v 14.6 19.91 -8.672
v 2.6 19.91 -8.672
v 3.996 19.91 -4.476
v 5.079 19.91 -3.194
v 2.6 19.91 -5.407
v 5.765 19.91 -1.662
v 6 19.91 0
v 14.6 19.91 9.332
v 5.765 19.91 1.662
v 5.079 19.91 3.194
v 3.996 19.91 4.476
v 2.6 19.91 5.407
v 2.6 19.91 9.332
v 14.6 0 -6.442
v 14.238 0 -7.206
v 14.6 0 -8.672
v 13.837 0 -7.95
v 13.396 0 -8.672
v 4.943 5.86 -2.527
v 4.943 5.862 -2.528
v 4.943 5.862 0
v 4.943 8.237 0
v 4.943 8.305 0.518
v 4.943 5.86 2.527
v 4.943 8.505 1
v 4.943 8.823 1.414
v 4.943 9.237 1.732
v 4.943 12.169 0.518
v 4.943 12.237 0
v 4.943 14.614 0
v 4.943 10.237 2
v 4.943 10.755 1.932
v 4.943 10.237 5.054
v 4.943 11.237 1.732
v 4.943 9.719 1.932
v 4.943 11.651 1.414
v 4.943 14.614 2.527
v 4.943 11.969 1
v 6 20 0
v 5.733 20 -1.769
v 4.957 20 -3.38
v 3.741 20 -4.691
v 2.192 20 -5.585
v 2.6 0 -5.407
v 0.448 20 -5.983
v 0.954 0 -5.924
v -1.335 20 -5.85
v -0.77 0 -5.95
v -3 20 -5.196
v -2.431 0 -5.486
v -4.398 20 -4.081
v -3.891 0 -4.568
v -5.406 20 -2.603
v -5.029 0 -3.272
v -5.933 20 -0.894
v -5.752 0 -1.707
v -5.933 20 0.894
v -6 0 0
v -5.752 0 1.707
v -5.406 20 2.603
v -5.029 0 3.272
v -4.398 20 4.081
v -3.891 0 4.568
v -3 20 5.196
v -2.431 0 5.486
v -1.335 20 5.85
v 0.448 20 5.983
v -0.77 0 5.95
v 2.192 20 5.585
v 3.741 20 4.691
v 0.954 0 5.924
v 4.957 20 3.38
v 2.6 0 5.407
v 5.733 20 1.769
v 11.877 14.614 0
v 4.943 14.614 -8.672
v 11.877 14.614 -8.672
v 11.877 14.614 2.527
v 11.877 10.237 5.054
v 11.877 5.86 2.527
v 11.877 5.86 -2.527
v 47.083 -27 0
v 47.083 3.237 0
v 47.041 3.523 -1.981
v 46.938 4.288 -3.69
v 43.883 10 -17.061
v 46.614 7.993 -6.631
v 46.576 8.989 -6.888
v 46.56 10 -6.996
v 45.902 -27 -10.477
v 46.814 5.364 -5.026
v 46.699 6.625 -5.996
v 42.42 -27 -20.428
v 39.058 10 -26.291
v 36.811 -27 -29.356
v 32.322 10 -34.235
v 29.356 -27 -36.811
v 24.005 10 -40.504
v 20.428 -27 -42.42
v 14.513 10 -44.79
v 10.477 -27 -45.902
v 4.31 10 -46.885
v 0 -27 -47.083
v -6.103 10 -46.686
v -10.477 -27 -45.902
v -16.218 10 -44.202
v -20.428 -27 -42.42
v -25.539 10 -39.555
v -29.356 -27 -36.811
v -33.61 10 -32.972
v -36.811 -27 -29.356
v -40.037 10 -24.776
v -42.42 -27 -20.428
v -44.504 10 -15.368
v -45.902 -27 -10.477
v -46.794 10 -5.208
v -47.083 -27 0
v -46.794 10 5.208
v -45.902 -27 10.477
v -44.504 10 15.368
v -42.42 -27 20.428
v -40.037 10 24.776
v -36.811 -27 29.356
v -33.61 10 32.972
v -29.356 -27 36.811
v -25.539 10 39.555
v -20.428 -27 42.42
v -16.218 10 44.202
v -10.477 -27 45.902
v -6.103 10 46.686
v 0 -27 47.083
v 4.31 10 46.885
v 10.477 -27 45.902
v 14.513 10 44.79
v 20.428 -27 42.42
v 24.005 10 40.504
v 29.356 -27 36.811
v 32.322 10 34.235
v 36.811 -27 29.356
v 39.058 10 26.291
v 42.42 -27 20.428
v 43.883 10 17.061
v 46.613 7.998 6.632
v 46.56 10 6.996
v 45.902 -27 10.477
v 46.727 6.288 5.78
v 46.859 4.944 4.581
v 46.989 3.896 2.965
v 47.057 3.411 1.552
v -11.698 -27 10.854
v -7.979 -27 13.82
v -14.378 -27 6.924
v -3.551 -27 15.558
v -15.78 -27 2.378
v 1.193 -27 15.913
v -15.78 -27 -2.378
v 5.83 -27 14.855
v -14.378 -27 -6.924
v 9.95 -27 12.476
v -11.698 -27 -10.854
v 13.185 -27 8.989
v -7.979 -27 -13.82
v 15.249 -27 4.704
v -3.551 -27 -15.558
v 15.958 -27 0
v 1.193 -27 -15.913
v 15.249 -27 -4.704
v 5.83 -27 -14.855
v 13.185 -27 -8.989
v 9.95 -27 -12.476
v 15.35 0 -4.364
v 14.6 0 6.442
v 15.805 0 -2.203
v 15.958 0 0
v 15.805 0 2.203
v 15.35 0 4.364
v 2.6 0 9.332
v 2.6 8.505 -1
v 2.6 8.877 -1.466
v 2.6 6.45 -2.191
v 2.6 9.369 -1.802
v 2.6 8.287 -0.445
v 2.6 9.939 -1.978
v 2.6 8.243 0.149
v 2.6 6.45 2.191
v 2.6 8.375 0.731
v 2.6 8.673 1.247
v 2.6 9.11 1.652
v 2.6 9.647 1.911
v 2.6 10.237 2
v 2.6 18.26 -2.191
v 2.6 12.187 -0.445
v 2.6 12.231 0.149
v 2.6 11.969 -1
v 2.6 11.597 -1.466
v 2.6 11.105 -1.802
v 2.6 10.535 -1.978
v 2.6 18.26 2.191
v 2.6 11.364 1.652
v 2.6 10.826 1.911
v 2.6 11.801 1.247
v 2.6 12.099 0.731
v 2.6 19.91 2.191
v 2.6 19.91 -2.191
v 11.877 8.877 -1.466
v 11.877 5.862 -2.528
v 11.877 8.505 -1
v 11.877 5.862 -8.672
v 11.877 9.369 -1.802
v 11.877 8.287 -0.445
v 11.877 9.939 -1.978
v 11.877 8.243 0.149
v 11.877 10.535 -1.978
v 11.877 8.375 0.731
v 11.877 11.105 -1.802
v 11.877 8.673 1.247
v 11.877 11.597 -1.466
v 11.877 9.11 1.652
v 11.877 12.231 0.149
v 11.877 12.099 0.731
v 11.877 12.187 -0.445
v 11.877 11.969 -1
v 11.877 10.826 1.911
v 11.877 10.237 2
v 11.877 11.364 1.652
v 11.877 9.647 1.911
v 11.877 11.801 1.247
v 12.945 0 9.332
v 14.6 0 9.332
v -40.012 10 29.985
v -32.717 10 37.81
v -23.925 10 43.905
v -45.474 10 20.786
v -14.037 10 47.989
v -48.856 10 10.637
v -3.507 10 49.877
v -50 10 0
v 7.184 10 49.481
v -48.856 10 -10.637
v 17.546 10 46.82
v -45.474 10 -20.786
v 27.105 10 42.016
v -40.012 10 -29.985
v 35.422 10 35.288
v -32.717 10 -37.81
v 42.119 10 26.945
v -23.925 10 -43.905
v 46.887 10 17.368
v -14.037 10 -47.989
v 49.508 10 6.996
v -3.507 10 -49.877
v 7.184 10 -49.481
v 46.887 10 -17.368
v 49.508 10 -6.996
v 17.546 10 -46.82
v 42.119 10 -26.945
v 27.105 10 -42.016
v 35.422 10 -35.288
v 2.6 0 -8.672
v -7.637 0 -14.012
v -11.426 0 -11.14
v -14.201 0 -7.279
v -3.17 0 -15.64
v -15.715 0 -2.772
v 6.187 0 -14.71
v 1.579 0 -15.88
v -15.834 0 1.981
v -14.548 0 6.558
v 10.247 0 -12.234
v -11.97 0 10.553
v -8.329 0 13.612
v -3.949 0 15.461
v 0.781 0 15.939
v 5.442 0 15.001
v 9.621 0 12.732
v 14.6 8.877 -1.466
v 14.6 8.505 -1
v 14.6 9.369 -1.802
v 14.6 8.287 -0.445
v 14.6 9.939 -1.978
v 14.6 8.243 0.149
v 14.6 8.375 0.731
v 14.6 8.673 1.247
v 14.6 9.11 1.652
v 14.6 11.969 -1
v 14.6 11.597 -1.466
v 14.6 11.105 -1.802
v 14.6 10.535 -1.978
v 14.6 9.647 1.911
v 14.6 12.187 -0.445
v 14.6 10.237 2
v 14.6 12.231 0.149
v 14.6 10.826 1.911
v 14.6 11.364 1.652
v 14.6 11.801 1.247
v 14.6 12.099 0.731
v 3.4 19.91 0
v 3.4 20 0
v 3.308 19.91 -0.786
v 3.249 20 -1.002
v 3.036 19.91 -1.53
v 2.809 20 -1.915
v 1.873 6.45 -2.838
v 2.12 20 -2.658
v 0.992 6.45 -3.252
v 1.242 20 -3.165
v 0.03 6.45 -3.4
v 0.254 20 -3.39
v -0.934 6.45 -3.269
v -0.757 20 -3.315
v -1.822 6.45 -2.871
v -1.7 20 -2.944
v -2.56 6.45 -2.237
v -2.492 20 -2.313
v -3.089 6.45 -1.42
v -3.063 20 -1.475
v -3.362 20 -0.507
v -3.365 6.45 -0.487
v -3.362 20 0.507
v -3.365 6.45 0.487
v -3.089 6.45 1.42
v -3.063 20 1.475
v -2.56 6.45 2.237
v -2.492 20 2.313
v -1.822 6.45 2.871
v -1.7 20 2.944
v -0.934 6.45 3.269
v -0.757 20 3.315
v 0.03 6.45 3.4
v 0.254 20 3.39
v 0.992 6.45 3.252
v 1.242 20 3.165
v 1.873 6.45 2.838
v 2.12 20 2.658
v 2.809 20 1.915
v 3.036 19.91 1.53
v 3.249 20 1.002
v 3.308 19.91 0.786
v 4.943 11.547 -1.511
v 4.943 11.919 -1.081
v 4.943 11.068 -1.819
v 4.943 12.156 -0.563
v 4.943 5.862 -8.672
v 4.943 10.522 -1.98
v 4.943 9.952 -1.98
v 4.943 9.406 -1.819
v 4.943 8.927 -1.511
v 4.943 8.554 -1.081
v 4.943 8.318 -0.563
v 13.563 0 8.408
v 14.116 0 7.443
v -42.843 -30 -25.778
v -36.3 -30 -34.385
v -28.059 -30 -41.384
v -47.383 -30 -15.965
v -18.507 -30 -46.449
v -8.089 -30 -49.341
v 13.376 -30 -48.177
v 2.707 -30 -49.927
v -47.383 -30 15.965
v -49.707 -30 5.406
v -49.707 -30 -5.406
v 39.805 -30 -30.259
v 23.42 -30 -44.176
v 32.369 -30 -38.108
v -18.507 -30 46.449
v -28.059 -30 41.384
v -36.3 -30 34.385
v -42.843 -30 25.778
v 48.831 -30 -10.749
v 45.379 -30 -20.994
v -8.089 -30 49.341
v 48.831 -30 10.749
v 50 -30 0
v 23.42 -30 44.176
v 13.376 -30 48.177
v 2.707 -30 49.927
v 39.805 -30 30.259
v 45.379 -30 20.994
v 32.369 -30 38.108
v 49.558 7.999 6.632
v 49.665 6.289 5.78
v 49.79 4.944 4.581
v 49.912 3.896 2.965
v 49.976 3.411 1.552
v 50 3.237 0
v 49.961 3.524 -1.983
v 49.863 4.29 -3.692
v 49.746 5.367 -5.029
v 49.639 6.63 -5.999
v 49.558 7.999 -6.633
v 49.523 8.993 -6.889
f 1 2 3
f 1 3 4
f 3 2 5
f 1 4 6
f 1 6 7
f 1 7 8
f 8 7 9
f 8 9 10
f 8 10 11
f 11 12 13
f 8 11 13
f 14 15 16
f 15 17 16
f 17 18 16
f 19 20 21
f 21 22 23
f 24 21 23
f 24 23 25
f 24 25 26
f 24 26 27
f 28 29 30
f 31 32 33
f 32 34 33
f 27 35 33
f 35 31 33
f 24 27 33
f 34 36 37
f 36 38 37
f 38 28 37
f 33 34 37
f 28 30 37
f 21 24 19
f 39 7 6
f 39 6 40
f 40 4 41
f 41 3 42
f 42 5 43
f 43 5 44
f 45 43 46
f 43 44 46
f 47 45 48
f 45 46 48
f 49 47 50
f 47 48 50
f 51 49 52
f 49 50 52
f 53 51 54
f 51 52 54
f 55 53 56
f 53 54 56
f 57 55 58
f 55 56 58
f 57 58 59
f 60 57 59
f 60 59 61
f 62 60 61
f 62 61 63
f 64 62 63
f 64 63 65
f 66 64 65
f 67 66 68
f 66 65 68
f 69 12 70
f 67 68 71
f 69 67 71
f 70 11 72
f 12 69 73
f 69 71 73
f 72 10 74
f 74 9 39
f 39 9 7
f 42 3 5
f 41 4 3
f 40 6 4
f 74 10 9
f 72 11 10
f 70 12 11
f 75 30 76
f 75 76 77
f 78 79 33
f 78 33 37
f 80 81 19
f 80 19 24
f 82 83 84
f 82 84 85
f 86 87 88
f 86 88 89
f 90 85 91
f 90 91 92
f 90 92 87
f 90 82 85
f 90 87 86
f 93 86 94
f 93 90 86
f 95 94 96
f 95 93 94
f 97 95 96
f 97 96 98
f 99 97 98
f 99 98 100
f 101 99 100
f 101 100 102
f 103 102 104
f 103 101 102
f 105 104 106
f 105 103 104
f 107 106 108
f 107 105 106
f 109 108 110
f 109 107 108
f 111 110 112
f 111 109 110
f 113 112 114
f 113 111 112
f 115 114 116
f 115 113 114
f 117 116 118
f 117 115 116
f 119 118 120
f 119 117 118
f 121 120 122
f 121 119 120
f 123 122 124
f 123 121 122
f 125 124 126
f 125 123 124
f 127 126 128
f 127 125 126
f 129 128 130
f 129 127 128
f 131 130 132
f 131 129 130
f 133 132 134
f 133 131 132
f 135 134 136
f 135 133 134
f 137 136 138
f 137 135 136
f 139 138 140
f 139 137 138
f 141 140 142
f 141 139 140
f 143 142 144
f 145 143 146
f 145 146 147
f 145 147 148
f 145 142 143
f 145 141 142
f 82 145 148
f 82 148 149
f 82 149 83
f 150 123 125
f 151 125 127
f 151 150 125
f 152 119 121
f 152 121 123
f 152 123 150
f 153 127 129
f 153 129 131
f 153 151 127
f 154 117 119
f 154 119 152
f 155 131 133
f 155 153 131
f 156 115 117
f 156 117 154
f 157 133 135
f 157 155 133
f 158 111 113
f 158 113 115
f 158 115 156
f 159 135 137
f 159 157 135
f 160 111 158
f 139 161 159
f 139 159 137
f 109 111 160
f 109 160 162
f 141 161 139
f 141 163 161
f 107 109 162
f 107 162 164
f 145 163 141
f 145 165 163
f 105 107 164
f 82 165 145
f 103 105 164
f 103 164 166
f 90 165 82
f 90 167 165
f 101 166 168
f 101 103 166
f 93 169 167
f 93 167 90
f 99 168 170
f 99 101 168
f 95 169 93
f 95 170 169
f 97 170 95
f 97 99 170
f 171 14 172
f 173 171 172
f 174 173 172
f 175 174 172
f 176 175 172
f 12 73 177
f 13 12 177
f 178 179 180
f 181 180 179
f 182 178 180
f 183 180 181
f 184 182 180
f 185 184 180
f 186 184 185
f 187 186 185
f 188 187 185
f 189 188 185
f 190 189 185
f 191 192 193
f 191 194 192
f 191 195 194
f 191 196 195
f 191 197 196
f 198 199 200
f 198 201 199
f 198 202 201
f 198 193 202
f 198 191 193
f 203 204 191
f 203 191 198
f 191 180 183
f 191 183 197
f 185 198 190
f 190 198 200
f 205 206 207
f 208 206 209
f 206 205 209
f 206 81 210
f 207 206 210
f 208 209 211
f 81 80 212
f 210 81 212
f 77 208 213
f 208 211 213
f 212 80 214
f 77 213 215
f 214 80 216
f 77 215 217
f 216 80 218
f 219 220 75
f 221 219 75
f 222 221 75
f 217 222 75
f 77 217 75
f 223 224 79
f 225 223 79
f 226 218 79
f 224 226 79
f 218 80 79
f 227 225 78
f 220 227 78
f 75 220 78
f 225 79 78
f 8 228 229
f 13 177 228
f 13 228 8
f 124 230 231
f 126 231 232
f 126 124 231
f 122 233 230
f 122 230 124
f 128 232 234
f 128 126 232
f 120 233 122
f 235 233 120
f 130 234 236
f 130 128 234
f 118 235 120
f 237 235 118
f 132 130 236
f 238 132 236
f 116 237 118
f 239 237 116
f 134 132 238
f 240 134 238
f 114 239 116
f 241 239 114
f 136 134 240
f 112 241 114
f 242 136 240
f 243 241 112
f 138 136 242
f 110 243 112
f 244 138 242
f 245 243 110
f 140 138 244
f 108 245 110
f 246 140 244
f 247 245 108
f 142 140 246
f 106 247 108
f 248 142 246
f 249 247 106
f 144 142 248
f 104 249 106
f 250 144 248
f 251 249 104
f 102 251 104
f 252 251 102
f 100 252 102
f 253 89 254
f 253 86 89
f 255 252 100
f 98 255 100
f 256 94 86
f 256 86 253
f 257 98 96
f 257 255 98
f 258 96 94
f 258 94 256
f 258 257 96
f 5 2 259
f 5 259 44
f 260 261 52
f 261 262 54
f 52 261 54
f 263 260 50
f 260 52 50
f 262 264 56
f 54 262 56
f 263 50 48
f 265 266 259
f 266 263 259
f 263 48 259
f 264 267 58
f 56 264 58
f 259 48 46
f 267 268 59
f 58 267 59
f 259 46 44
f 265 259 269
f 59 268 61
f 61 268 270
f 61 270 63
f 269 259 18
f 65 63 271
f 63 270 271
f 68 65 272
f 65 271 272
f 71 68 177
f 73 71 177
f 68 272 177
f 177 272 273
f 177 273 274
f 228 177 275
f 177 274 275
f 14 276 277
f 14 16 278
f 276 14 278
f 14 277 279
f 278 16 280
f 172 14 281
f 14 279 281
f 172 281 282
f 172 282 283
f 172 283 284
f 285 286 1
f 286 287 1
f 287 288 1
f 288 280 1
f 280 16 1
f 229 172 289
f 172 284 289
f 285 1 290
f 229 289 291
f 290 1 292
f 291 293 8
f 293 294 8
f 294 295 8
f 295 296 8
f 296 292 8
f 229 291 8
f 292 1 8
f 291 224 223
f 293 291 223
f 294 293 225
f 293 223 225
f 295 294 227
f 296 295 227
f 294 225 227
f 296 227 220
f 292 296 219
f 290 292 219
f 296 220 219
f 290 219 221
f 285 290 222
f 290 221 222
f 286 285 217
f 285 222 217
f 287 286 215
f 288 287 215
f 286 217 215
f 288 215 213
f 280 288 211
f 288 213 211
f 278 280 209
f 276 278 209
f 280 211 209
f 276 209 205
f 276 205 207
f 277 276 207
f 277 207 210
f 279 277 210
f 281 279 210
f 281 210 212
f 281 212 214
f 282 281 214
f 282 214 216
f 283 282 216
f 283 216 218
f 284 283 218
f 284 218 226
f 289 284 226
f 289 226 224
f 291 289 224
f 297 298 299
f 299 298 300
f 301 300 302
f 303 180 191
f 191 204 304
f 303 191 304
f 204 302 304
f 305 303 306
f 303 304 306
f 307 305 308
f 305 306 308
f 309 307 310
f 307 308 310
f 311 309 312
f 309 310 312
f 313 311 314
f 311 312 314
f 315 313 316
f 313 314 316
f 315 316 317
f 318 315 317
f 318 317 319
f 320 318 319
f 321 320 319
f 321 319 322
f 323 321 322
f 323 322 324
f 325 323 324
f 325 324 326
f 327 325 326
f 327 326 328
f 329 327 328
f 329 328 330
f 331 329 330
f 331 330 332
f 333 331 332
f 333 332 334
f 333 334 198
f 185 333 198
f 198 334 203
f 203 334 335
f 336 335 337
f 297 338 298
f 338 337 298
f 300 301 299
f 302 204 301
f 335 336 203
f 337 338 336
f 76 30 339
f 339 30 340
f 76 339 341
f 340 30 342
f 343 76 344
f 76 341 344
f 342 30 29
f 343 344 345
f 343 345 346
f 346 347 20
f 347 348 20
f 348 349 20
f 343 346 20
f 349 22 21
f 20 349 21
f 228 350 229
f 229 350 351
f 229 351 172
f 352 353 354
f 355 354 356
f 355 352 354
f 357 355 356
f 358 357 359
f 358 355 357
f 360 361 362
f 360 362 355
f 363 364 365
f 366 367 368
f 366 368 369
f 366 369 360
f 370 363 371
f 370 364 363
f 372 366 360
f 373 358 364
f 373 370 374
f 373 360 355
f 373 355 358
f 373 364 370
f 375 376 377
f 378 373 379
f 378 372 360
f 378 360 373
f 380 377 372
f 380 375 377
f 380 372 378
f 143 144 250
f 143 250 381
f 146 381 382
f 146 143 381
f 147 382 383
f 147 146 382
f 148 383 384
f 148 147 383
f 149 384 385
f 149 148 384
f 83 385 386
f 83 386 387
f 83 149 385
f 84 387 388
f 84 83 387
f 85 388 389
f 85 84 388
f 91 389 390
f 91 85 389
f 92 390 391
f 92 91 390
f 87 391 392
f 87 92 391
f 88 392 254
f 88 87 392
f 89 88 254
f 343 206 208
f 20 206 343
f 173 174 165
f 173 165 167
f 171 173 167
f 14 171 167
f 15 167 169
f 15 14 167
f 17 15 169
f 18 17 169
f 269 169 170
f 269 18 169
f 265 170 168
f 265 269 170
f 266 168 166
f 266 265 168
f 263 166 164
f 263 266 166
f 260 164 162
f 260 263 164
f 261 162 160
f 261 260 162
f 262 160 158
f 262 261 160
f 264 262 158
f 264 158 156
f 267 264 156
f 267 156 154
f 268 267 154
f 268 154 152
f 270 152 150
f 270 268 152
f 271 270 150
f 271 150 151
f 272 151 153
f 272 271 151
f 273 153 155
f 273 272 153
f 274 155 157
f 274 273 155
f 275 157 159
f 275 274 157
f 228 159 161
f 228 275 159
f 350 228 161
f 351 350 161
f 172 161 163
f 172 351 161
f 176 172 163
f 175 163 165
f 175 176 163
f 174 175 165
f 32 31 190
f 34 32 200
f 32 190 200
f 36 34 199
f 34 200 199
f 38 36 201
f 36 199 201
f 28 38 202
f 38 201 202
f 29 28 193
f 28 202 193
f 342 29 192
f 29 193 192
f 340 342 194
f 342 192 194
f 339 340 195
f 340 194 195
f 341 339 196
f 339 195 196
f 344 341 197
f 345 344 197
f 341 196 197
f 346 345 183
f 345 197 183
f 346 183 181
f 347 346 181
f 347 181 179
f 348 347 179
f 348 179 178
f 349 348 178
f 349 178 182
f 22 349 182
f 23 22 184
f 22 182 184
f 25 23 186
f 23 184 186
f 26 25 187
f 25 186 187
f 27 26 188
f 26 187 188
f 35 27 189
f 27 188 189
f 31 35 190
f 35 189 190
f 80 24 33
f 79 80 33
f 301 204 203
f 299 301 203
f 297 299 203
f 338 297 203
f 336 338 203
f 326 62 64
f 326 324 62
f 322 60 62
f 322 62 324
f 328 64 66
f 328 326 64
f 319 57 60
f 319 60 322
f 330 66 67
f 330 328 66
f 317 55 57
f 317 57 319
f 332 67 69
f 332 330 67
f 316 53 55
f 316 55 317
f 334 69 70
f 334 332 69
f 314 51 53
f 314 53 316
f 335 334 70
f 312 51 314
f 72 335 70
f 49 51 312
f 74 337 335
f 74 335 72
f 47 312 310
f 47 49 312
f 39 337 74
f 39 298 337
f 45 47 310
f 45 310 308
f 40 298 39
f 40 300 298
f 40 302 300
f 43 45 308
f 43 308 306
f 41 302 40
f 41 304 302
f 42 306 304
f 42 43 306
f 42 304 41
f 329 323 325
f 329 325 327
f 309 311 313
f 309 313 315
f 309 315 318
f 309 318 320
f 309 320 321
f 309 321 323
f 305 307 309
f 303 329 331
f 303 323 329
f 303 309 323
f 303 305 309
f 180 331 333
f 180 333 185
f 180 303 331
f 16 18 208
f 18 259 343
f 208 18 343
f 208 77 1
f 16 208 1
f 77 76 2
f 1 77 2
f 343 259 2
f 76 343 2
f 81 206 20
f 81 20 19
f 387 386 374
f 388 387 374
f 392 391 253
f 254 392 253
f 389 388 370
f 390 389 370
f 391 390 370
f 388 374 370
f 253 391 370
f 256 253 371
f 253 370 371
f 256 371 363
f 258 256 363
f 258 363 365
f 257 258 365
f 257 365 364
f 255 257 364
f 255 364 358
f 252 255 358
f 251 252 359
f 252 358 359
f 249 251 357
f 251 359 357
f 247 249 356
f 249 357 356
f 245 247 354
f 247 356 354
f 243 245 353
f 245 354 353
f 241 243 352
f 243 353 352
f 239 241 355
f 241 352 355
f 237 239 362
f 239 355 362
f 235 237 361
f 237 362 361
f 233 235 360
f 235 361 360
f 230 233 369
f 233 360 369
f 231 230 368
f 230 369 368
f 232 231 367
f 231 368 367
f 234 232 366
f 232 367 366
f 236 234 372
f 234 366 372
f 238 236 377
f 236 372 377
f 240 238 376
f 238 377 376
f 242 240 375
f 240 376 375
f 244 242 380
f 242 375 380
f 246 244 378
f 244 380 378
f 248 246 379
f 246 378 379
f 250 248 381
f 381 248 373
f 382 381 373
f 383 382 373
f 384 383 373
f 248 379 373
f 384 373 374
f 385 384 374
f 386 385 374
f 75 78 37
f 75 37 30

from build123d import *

# Parameters (mm, degrees)
SKETCH1_R               = 6
BOSS_EXTRUDE1_DEPTH     = 20
SKETCH2_R               = 3.4
CUT_EXTRUDE1_DEPTH      = 13.55
SKETCH5_W               = 1.550685087
SKETCH5_H               = 7.184215806
BOSS_EXTRUDE2_DEPTH     = 13.55
SKETCH7_W               = 18.003976239
SKETCH7_H               = 19.909960041
BOSS_EXTRUDE3_DEPTH     = 12
SKETCH6_R               = 2
CUT_EXTRUDE2_DEPTH      = 1
CUT_EXTRUDE2_DEPTH_BACK = 13.55
NUTOPENING_DEPTH        = 10
SKETCH10_R              = 50
BOSS_EXTRUDE4_DEPTH     = 30
SKETCH12_R              = 47.082764373
SKETCH12_R_2            = 15.95790089
CUT_EXTRUDE5_DEPTH      = 27
SKETCH13_R              = 50
SKETCH13_R_2            = 47.082764373
BOSS_EXTRUDE5_DEPTH     = 10
CUT_EXTRUDE6_DEPTH      = 6.933086
SKETCH16_R              = 7
CUT_EXTRUDE7_DEPTH      = 40


with BuildPart() as part:
    # Sketch1 → Boss-Extrude1 (new body)
    with BuildSketch(Plane(origin=(0, 0, 0), x_dir=(1, 0, 0), z_dir=(0, 1, 0))):
        Circle(SKETCH1_R)
    extrude(amount=BOSS_EXTRUDE1_DEPTH)

    # Sketch2 → Cut-Extrude1 (cut)
    with BuildSketch(Plane(origin=(0, 20, 0), x_dir=(1, 0, 0), z_dir=(0, 1, 0))):
        Circle(SKETCH2_R)
    extrude(amount=-CUT_EXTRUDE1_DEPTH, mode=Mode.SUBTRACT)

    # Sketch5 → Boss-Extrude2 (add)
    with BuildSketch(Plane(origin=(0, 18.26, 0), x_dir=(1, 0, 0), z_dir=(0, 1, 0))):
        with Locations((3.375342544, 0.020519704)):
            Rectangle(SKETCH5_W, SKETCH5_H)
    extrude(amount=-BOSS_EXTRUDE2_DEPTH)

    # Sketch7 → Boss-Extrude3 (add)
    with BuildSketch(Plane.ZY.offset(-2.6)):
        with Locations((0.33027221, 9.954980021)):
            Rectangle(SKETCH7_W, SKETCH7_H)
    extrude(amount=-BOSS_EXTRUDE3_DEPTH)

    # Sketch6 → Cut-Extrude2 (cut, two sides)
    with BuildSketch(Plane.ZY.offset(-2.6)) as cut_extrude2_sk:
        with Locations((0, 10.236925537)):
            Circle(SKETCH6_R)
    extrude(amount=CUT_EXTRUDE2_DEPTH, mode=Mode.SUBTRACT)
    extrude(cut_extrude2_sk.sketch, amount=-CUT_EXTRUDE2_DEPTH_BACK, mode=Mode.SUBTRACT)

    # Sketch9 → NutOpening (cut)
    with BuildSketch(Plane.XY):
        Polygon((11.876516377, 10.236925537), (11.876516377, 5.861925537), (4.943430227, 5.861925537), (4.943430227, 10.236925537), (4.943430227, 14.614332445), (11.876516377, 14.614332445), align=None)
    extrude(amount=-NUTOPENING_DEPTH, mode=Mode.SUBTRACT)

    # Sketch10 → Boss-Extrude4 (add)
    with BuildSketch(Plane.XZ):
        Circle(SKETCH10_R)
    extrude(amount=BOSS_EXTRUDE4_DEPTH)

    # Sketch12 → Cut-Extrude5 (cut)
    with BuildSketch(Plane(origin=(0, 0, 0), x_dir=(1, 0, 0), z_dir=(0, 1, 0))):
        Circle(SKETCH12_R)
        Circle(SKETCH12_R_2, mode=Mode.SUBTRACT)
    extrude(amount=-CUT_EXTRUDE5_DEPTH, mode=Mode.SUBTRACT)

    # Sketch13 → Boss-Extrude5 (add)
    with BuildSketch(Plane(origin=(0, 0, 0), x_dir=(1, 0, 0), z_dir=(0, 1, 0))):
        Circle(SKETCH13_R)
        Circle(SKETCH13_R_2, mode=Mode.SUBTRACT)
    extrude(amount=BOSS_EXTRUDE5_DEPTH)

    # Sketch14 → Cut-Extrude6 (cut)
    with BuildSketch(Plane.ZY.offset(-11.876516377)):
        Polygon((-5.054124256, 10.236925537), (-2.527062128, 5.859925537), (2.527062128, 5.859925537), (5.054124256, 10.236925537), (2.527062128, 14.613925537), (-2.527062128, 14.613925537), align=None)
    extrude(amount=CUT_EXTRUDE6_DEPTH, mode=Mode.SUBTRACT)

    # Sketch16 → Cut-Extrude7 (cut)
    with BuildSketch(Plane(origin=(14.6, 0, 0), x_dir=(0, 0, -1), z_dir=(1, 0, 0))):
        with Locations((0, 10.236925537)):
            Circle(SKETCH16_R)
    extrude(amount=CUT_EXTRUDE7_DEPTH, mode=Mode.SUBTRACT)


solid = part.part
